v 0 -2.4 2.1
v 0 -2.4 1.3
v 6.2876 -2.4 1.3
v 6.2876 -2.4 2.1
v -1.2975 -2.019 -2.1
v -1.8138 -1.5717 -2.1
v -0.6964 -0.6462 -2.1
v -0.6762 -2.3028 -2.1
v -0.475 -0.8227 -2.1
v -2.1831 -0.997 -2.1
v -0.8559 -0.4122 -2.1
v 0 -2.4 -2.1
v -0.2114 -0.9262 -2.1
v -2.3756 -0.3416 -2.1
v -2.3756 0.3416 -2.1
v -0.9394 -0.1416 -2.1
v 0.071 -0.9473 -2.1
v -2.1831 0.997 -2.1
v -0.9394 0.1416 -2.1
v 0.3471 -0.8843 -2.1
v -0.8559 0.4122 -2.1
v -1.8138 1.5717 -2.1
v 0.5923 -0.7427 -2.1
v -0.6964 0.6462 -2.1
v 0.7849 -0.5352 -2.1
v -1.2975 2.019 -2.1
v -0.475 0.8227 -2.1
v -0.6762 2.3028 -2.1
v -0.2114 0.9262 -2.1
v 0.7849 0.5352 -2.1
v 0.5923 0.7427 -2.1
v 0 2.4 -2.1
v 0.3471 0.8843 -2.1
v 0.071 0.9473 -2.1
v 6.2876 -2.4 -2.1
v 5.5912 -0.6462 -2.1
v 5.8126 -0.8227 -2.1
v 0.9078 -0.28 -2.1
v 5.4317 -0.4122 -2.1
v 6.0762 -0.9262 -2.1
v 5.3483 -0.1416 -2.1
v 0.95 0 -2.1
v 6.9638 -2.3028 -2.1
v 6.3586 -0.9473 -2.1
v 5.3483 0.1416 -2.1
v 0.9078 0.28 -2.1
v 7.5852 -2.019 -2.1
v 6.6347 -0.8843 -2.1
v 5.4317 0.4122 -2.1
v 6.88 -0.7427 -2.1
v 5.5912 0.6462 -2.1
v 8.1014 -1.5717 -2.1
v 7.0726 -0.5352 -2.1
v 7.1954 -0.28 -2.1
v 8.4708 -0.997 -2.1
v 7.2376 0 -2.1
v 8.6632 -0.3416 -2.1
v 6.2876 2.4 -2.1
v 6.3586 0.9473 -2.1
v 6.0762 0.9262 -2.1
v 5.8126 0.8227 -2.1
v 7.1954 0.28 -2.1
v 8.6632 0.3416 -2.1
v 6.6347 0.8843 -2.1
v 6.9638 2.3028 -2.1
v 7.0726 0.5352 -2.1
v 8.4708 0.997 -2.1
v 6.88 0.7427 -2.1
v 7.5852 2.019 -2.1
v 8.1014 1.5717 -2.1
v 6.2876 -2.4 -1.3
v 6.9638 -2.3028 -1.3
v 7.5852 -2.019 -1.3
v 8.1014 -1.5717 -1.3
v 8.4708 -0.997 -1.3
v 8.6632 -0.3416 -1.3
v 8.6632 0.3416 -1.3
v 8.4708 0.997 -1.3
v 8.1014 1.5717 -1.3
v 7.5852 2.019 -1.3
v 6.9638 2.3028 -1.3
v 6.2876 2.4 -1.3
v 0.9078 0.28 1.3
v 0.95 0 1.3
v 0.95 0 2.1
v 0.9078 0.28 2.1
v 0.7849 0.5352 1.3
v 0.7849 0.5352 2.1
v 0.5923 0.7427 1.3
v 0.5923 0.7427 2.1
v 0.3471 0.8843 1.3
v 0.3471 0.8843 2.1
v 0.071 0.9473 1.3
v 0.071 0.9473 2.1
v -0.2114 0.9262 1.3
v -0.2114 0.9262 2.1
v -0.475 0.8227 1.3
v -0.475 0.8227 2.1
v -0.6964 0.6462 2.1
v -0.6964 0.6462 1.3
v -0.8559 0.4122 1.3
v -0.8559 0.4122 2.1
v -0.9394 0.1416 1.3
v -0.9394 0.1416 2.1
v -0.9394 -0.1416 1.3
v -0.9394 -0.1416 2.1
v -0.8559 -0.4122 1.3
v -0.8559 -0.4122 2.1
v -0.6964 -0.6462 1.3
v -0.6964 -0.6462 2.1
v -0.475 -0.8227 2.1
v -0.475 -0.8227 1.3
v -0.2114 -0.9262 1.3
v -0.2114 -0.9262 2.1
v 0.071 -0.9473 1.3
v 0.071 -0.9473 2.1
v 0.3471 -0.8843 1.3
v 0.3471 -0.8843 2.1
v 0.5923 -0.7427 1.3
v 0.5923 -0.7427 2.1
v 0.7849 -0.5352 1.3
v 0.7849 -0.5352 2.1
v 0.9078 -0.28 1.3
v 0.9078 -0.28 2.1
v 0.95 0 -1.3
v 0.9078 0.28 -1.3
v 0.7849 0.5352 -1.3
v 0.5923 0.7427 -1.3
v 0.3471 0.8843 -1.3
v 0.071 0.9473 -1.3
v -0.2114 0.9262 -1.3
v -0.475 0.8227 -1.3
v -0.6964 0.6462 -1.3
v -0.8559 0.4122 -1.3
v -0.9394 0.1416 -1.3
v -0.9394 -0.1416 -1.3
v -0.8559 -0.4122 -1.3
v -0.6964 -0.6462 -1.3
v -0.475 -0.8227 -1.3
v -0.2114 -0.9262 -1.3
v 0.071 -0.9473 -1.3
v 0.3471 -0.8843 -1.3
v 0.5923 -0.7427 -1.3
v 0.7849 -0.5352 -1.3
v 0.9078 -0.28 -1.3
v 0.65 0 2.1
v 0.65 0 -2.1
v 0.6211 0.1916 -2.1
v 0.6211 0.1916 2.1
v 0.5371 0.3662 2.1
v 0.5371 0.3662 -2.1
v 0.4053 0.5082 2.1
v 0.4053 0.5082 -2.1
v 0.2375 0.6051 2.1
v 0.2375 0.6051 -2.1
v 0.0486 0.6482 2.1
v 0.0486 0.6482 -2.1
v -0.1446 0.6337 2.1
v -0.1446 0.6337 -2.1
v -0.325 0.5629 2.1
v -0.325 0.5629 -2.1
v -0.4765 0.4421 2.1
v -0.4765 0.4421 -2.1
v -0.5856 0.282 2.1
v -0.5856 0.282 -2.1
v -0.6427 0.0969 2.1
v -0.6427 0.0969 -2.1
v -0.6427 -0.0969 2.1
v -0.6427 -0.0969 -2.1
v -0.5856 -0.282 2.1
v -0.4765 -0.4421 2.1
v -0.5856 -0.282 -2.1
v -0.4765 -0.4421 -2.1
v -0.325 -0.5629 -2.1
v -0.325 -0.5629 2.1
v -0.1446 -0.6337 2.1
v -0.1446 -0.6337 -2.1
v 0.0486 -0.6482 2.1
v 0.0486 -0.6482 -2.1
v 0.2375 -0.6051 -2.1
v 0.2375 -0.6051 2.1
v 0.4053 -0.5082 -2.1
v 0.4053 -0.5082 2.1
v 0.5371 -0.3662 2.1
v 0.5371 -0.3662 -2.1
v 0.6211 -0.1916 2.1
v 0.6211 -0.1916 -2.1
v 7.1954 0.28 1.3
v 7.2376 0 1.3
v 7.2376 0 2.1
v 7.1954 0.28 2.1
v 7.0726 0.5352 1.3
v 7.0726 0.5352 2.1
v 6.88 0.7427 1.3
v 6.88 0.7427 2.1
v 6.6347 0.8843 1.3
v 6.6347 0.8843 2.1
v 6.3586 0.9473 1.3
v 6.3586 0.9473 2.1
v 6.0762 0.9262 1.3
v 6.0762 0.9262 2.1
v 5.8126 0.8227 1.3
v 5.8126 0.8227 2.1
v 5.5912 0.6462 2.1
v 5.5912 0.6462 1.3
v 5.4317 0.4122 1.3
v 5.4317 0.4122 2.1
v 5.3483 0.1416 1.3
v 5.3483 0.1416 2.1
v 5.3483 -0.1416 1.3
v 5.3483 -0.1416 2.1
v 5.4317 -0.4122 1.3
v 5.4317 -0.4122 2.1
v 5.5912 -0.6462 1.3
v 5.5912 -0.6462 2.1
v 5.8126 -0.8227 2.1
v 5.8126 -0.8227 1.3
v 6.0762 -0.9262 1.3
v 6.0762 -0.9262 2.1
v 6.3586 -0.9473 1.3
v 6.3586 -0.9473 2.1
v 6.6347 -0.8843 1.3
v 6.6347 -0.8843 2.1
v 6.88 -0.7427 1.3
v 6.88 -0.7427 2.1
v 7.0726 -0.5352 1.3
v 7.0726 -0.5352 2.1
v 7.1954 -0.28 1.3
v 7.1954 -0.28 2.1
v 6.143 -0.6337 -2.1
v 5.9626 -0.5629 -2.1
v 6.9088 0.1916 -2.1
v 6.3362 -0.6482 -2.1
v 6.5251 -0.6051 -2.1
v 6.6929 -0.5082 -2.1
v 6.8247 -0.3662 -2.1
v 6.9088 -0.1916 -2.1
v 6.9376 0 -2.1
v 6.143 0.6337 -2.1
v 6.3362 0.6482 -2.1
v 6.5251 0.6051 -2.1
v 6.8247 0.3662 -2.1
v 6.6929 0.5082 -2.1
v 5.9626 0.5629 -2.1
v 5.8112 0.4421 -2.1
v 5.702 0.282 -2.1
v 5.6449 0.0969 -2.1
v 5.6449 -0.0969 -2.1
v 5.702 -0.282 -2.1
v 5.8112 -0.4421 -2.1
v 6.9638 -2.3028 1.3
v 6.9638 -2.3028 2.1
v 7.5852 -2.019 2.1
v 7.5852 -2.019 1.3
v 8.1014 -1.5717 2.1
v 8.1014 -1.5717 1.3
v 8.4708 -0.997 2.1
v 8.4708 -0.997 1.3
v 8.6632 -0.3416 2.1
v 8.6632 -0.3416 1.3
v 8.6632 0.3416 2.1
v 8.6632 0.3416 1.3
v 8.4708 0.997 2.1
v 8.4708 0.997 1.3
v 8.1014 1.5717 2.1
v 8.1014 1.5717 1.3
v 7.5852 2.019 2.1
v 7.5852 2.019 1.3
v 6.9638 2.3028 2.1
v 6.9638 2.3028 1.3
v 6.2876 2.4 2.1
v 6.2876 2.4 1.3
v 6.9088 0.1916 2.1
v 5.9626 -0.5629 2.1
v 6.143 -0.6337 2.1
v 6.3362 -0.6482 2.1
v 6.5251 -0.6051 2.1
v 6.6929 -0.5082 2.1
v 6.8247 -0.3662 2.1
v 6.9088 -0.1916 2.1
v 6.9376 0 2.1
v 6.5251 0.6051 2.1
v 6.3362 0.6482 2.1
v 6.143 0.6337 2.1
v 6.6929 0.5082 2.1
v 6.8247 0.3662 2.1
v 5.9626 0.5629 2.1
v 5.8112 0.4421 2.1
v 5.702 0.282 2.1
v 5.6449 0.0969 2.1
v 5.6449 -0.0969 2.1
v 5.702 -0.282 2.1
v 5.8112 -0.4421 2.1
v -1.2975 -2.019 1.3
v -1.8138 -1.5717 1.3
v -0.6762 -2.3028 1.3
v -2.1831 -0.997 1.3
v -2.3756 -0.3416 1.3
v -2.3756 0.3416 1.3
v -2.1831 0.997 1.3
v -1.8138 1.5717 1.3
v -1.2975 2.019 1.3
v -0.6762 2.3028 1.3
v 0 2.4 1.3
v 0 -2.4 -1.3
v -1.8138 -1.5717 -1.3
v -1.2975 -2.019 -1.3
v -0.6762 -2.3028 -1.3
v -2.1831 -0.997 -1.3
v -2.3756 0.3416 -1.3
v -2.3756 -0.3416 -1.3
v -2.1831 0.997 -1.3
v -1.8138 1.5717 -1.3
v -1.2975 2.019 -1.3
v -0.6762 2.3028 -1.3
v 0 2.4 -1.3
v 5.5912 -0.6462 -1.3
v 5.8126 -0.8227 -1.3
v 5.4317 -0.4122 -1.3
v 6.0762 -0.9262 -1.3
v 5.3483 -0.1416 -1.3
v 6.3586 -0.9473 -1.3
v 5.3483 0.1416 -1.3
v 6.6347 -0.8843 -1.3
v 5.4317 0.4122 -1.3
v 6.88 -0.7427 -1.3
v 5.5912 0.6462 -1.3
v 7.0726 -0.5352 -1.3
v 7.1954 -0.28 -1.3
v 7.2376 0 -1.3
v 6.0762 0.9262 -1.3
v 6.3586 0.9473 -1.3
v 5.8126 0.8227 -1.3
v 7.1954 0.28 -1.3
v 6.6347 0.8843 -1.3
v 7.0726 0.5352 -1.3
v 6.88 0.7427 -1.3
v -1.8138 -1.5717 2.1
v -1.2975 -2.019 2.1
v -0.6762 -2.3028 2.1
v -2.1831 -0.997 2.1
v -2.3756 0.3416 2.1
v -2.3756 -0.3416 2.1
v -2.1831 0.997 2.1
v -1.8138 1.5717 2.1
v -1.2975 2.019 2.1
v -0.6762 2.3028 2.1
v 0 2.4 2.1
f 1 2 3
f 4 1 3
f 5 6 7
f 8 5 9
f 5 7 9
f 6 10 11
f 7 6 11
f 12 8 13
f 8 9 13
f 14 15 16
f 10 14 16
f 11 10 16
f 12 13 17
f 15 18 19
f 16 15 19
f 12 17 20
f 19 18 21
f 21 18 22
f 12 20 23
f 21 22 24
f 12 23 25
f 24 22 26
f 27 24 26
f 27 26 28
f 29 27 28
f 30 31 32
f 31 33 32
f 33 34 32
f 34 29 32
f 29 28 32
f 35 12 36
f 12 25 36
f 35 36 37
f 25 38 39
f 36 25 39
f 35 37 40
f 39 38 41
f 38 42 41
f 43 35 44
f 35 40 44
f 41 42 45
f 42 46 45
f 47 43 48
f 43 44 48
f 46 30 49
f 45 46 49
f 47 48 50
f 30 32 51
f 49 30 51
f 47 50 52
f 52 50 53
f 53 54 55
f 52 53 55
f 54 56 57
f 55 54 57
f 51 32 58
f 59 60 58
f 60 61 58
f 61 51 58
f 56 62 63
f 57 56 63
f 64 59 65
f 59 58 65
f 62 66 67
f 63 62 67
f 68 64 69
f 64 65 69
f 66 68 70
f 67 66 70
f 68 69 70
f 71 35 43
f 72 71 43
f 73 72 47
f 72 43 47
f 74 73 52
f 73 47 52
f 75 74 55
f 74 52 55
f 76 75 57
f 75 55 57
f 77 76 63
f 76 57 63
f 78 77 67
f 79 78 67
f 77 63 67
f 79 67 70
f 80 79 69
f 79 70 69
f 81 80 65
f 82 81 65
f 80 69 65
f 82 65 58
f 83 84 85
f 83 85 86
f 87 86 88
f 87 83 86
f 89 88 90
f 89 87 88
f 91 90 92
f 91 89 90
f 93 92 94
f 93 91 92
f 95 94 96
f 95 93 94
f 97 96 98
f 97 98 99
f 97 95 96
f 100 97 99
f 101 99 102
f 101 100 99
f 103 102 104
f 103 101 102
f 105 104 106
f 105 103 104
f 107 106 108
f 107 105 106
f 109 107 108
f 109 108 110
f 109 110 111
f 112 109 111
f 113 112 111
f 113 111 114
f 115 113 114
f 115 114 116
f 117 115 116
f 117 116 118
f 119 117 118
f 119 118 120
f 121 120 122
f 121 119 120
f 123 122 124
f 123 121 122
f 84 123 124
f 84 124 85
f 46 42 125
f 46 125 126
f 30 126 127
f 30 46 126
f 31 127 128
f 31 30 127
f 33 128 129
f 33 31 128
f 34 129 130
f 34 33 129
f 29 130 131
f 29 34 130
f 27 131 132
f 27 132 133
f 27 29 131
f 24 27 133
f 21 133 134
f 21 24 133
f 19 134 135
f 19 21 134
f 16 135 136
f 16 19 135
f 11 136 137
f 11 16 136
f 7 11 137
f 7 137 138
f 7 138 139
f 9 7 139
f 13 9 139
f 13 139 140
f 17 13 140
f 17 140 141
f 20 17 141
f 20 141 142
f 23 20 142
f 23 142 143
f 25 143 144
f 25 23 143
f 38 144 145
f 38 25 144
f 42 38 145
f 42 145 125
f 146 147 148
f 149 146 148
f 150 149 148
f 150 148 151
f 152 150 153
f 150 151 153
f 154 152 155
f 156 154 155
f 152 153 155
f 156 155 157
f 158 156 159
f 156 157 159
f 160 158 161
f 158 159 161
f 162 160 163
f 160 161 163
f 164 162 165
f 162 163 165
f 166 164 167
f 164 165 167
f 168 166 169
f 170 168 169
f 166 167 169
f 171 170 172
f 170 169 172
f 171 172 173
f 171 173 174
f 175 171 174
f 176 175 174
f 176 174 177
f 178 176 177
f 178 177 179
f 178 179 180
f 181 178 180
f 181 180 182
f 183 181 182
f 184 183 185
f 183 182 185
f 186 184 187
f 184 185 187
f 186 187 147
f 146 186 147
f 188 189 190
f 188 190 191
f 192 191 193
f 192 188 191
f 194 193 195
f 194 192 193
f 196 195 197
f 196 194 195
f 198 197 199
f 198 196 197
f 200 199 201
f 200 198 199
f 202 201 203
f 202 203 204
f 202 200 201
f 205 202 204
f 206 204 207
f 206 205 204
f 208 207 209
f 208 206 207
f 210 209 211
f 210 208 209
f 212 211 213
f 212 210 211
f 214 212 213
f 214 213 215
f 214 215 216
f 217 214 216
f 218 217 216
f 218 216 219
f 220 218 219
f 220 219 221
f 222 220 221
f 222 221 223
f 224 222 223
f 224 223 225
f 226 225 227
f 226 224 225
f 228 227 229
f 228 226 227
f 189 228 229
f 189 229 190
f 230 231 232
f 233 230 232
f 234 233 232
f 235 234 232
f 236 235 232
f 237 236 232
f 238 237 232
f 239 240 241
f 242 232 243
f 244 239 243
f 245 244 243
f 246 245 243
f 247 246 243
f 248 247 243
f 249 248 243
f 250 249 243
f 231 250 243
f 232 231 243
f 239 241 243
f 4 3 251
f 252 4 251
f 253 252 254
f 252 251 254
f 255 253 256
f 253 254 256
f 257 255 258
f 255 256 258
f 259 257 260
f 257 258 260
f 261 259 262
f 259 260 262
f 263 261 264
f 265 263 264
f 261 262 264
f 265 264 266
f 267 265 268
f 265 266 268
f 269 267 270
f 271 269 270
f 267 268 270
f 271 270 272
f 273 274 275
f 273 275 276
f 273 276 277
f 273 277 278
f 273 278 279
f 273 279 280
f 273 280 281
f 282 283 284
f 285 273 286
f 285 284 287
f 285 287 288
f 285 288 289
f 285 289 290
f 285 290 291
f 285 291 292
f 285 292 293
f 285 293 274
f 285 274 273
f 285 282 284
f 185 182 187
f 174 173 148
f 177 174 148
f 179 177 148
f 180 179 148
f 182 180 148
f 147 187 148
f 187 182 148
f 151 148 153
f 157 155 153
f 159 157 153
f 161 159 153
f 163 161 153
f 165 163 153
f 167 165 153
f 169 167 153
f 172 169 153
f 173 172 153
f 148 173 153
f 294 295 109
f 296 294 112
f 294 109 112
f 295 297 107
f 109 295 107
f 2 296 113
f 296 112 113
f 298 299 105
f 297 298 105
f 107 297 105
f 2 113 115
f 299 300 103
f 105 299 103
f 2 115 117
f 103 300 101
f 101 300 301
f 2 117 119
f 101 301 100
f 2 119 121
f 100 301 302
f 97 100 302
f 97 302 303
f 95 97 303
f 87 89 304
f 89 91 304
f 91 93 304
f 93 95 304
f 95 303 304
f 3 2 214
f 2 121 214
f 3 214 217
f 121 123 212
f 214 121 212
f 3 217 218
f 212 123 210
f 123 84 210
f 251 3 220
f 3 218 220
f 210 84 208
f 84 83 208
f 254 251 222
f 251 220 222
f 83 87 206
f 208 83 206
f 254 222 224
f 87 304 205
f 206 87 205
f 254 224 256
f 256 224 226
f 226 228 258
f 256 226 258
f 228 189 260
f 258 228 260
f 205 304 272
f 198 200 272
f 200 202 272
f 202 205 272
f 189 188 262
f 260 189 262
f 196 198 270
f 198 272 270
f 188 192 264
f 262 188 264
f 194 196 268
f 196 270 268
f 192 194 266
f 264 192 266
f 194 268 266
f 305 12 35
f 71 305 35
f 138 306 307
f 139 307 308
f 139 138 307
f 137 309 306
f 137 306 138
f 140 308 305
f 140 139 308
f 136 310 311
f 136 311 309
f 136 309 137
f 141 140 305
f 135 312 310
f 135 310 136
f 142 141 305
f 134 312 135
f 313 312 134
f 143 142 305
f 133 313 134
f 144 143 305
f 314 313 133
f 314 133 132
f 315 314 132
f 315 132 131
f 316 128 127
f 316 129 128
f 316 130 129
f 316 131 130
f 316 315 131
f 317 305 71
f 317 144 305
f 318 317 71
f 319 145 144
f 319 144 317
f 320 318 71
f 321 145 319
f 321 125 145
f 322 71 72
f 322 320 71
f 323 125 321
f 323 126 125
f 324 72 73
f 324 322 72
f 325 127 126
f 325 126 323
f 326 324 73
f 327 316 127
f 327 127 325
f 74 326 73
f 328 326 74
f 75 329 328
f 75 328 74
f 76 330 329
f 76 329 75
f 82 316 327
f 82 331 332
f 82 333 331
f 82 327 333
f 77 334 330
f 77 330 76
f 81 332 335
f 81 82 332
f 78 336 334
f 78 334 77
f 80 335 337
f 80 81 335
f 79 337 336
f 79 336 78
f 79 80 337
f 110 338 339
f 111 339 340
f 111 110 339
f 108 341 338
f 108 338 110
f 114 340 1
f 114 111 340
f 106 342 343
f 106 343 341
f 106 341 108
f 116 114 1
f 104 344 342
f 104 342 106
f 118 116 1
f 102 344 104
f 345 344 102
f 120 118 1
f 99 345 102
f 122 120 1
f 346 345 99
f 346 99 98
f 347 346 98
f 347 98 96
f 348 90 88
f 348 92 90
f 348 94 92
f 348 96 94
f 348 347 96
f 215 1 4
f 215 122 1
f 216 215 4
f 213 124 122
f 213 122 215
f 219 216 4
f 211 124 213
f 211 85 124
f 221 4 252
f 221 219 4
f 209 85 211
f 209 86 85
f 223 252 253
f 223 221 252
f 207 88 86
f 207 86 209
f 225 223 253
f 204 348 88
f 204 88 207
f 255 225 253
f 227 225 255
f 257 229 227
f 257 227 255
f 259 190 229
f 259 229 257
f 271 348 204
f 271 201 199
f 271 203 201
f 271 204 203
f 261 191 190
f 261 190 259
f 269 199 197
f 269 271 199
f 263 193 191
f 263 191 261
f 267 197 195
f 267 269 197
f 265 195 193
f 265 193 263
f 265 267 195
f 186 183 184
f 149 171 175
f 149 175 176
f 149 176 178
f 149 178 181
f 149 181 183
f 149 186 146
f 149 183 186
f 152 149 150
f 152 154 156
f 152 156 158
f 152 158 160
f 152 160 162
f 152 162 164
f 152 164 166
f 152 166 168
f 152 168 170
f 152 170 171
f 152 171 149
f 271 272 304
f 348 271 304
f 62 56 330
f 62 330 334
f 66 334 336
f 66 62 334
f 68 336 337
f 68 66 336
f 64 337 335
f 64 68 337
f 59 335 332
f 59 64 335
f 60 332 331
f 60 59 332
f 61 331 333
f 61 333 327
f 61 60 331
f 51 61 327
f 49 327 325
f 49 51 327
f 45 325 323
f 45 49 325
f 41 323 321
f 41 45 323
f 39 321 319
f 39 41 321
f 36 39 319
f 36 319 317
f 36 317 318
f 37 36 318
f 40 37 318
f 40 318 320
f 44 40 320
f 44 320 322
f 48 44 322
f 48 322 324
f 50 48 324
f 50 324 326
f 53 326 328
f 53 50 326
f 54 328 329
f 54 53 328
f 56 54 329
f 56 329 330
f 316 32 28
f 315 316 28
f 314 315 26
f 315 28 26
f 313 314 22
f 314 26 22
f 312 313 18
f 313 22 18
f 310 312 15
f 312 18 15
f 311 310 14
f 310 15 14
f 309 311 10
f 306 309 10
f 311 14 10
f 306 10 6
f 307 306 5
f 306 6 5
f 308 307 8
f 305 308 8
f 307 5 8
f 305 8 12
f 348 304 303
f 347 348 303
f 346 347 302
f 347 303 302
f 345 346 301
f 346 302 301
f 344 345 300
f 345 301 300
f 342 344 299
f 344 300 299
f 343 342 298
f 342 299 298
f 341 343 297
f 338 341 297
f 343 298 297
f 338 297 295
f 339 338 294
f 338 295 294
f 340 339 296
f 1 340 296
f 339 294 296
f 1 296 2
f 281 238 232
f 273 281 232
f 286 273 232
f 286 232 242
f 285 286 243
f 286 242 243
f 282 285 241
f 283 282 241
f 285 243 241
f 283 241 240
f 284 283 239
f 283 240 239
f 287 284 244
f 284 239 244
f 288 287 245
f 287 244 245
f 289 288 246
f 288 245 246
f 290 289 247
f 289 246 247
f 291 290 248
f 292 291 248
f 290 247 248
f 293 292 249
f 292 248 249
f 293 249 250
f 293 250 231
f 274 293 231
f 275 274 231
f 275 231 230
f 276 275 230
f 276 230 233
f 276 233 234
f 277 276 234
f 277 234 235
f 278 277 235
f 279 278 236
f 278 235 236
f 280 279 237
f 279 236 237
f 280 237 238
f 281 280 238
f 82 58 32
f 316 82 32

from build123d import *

# Parameters (mm, degrees)
BOSS_EXTRUDE1_START   = 1.3
SKETCH1_R             = 0.95
BOSS_EXTRUDE1_DEPTH   = 0.8
BOSS_EXTRUDE2_START   = -2.1
SKETCH2_R             = 0.95
BOSS_EXTRUDE2_DEPTH   = 0.8
BOSS_EXTRUDE3_START   = -2.1
SKETCH3_R             = 0.65
BOSS_EXTRUDE3_DEPTH   = 4.2
BOSS_EXTRUDE3_2_DEPTH = 4.2


with BuildPart() as part:
    # Sketch1 → Boss-Extrude1 (new body)
    with BuildSketch(Plane.XY.offset(BOSS_EXTRUDE1_START)):
        with BuildLine():
            Line((0, -2.4), (6.287642552, -2.4))
            ThreePointArc((6.287642552, -2.4), (8.687642552, 0), (6.287642552, 2.4))
            Line((6.287642552, 2.4), (0, 2.4))
            ThreePointArc((0, 2.4), (-2.4, 0), (0, -2.4))
        make_face()
        Circle(SKETCH1_R, mode=Mode.SUBTRACT)
        with Locations((6.287642552, 0)):
            Circle(SKETCH1_R, mode=Mode.SUBTRACT)
    extrude(amount=BOSS_EXTRUDE1_DEPTH)


with BuildPart() as body_2:
    # Sketch2 → Boss-Extrude2 (new body)
    with BuildSketch(Plane.XY.offset(BOSS_EXTRUDE2_START)):
        with BuildLine():
            Line((0, -2.4), (6.287642552, -2.4))
            ThreePointArc((6.287642552, -2.4), (8.687642552, 0), (6.287642552, 2.4))
            Line((6.287642552, 2.4), (0, 2.4))
            ThreePointArc((0, 2.4), (-2.4, 0), (0, -2.4))
        make_face()
        Circle(SKETCH2_R, mode=Mode.SUBTRACT)
        with Locations((6.287642552, 0)):
            Circle(SKETCH2_R, mode=Mode.SUBTRACT)
    extrude(amount=BOSS_EXTRUDE2_DEPTH)


with BuildPart() as body_3:
    # Sketch3 → Boss-Extrude3 (new body)
    with BuildSketch(Plane.XY.offset(BOSS_EXTRUDE3_START)):
        Circle(SKETCH3_R)
    extrude(amount=BOSS_EXTRUDE3_DEPTH)


with BuildPart() as body_4:
    # Sketch3 → Boss-Extrude3 2 (new body)
    with BuildSketch(Plane.XY.offset(BOSS_EXTRUDE3_START)):
        with Locations((6.287642552, 0)):
            Circle(SKETCH3_R)
    extrude(amount=BOSS_EXTRUDE3_2_DEPTH)


solid = Compound([part.part, body_2.part, body_3.part, body_4.part])
